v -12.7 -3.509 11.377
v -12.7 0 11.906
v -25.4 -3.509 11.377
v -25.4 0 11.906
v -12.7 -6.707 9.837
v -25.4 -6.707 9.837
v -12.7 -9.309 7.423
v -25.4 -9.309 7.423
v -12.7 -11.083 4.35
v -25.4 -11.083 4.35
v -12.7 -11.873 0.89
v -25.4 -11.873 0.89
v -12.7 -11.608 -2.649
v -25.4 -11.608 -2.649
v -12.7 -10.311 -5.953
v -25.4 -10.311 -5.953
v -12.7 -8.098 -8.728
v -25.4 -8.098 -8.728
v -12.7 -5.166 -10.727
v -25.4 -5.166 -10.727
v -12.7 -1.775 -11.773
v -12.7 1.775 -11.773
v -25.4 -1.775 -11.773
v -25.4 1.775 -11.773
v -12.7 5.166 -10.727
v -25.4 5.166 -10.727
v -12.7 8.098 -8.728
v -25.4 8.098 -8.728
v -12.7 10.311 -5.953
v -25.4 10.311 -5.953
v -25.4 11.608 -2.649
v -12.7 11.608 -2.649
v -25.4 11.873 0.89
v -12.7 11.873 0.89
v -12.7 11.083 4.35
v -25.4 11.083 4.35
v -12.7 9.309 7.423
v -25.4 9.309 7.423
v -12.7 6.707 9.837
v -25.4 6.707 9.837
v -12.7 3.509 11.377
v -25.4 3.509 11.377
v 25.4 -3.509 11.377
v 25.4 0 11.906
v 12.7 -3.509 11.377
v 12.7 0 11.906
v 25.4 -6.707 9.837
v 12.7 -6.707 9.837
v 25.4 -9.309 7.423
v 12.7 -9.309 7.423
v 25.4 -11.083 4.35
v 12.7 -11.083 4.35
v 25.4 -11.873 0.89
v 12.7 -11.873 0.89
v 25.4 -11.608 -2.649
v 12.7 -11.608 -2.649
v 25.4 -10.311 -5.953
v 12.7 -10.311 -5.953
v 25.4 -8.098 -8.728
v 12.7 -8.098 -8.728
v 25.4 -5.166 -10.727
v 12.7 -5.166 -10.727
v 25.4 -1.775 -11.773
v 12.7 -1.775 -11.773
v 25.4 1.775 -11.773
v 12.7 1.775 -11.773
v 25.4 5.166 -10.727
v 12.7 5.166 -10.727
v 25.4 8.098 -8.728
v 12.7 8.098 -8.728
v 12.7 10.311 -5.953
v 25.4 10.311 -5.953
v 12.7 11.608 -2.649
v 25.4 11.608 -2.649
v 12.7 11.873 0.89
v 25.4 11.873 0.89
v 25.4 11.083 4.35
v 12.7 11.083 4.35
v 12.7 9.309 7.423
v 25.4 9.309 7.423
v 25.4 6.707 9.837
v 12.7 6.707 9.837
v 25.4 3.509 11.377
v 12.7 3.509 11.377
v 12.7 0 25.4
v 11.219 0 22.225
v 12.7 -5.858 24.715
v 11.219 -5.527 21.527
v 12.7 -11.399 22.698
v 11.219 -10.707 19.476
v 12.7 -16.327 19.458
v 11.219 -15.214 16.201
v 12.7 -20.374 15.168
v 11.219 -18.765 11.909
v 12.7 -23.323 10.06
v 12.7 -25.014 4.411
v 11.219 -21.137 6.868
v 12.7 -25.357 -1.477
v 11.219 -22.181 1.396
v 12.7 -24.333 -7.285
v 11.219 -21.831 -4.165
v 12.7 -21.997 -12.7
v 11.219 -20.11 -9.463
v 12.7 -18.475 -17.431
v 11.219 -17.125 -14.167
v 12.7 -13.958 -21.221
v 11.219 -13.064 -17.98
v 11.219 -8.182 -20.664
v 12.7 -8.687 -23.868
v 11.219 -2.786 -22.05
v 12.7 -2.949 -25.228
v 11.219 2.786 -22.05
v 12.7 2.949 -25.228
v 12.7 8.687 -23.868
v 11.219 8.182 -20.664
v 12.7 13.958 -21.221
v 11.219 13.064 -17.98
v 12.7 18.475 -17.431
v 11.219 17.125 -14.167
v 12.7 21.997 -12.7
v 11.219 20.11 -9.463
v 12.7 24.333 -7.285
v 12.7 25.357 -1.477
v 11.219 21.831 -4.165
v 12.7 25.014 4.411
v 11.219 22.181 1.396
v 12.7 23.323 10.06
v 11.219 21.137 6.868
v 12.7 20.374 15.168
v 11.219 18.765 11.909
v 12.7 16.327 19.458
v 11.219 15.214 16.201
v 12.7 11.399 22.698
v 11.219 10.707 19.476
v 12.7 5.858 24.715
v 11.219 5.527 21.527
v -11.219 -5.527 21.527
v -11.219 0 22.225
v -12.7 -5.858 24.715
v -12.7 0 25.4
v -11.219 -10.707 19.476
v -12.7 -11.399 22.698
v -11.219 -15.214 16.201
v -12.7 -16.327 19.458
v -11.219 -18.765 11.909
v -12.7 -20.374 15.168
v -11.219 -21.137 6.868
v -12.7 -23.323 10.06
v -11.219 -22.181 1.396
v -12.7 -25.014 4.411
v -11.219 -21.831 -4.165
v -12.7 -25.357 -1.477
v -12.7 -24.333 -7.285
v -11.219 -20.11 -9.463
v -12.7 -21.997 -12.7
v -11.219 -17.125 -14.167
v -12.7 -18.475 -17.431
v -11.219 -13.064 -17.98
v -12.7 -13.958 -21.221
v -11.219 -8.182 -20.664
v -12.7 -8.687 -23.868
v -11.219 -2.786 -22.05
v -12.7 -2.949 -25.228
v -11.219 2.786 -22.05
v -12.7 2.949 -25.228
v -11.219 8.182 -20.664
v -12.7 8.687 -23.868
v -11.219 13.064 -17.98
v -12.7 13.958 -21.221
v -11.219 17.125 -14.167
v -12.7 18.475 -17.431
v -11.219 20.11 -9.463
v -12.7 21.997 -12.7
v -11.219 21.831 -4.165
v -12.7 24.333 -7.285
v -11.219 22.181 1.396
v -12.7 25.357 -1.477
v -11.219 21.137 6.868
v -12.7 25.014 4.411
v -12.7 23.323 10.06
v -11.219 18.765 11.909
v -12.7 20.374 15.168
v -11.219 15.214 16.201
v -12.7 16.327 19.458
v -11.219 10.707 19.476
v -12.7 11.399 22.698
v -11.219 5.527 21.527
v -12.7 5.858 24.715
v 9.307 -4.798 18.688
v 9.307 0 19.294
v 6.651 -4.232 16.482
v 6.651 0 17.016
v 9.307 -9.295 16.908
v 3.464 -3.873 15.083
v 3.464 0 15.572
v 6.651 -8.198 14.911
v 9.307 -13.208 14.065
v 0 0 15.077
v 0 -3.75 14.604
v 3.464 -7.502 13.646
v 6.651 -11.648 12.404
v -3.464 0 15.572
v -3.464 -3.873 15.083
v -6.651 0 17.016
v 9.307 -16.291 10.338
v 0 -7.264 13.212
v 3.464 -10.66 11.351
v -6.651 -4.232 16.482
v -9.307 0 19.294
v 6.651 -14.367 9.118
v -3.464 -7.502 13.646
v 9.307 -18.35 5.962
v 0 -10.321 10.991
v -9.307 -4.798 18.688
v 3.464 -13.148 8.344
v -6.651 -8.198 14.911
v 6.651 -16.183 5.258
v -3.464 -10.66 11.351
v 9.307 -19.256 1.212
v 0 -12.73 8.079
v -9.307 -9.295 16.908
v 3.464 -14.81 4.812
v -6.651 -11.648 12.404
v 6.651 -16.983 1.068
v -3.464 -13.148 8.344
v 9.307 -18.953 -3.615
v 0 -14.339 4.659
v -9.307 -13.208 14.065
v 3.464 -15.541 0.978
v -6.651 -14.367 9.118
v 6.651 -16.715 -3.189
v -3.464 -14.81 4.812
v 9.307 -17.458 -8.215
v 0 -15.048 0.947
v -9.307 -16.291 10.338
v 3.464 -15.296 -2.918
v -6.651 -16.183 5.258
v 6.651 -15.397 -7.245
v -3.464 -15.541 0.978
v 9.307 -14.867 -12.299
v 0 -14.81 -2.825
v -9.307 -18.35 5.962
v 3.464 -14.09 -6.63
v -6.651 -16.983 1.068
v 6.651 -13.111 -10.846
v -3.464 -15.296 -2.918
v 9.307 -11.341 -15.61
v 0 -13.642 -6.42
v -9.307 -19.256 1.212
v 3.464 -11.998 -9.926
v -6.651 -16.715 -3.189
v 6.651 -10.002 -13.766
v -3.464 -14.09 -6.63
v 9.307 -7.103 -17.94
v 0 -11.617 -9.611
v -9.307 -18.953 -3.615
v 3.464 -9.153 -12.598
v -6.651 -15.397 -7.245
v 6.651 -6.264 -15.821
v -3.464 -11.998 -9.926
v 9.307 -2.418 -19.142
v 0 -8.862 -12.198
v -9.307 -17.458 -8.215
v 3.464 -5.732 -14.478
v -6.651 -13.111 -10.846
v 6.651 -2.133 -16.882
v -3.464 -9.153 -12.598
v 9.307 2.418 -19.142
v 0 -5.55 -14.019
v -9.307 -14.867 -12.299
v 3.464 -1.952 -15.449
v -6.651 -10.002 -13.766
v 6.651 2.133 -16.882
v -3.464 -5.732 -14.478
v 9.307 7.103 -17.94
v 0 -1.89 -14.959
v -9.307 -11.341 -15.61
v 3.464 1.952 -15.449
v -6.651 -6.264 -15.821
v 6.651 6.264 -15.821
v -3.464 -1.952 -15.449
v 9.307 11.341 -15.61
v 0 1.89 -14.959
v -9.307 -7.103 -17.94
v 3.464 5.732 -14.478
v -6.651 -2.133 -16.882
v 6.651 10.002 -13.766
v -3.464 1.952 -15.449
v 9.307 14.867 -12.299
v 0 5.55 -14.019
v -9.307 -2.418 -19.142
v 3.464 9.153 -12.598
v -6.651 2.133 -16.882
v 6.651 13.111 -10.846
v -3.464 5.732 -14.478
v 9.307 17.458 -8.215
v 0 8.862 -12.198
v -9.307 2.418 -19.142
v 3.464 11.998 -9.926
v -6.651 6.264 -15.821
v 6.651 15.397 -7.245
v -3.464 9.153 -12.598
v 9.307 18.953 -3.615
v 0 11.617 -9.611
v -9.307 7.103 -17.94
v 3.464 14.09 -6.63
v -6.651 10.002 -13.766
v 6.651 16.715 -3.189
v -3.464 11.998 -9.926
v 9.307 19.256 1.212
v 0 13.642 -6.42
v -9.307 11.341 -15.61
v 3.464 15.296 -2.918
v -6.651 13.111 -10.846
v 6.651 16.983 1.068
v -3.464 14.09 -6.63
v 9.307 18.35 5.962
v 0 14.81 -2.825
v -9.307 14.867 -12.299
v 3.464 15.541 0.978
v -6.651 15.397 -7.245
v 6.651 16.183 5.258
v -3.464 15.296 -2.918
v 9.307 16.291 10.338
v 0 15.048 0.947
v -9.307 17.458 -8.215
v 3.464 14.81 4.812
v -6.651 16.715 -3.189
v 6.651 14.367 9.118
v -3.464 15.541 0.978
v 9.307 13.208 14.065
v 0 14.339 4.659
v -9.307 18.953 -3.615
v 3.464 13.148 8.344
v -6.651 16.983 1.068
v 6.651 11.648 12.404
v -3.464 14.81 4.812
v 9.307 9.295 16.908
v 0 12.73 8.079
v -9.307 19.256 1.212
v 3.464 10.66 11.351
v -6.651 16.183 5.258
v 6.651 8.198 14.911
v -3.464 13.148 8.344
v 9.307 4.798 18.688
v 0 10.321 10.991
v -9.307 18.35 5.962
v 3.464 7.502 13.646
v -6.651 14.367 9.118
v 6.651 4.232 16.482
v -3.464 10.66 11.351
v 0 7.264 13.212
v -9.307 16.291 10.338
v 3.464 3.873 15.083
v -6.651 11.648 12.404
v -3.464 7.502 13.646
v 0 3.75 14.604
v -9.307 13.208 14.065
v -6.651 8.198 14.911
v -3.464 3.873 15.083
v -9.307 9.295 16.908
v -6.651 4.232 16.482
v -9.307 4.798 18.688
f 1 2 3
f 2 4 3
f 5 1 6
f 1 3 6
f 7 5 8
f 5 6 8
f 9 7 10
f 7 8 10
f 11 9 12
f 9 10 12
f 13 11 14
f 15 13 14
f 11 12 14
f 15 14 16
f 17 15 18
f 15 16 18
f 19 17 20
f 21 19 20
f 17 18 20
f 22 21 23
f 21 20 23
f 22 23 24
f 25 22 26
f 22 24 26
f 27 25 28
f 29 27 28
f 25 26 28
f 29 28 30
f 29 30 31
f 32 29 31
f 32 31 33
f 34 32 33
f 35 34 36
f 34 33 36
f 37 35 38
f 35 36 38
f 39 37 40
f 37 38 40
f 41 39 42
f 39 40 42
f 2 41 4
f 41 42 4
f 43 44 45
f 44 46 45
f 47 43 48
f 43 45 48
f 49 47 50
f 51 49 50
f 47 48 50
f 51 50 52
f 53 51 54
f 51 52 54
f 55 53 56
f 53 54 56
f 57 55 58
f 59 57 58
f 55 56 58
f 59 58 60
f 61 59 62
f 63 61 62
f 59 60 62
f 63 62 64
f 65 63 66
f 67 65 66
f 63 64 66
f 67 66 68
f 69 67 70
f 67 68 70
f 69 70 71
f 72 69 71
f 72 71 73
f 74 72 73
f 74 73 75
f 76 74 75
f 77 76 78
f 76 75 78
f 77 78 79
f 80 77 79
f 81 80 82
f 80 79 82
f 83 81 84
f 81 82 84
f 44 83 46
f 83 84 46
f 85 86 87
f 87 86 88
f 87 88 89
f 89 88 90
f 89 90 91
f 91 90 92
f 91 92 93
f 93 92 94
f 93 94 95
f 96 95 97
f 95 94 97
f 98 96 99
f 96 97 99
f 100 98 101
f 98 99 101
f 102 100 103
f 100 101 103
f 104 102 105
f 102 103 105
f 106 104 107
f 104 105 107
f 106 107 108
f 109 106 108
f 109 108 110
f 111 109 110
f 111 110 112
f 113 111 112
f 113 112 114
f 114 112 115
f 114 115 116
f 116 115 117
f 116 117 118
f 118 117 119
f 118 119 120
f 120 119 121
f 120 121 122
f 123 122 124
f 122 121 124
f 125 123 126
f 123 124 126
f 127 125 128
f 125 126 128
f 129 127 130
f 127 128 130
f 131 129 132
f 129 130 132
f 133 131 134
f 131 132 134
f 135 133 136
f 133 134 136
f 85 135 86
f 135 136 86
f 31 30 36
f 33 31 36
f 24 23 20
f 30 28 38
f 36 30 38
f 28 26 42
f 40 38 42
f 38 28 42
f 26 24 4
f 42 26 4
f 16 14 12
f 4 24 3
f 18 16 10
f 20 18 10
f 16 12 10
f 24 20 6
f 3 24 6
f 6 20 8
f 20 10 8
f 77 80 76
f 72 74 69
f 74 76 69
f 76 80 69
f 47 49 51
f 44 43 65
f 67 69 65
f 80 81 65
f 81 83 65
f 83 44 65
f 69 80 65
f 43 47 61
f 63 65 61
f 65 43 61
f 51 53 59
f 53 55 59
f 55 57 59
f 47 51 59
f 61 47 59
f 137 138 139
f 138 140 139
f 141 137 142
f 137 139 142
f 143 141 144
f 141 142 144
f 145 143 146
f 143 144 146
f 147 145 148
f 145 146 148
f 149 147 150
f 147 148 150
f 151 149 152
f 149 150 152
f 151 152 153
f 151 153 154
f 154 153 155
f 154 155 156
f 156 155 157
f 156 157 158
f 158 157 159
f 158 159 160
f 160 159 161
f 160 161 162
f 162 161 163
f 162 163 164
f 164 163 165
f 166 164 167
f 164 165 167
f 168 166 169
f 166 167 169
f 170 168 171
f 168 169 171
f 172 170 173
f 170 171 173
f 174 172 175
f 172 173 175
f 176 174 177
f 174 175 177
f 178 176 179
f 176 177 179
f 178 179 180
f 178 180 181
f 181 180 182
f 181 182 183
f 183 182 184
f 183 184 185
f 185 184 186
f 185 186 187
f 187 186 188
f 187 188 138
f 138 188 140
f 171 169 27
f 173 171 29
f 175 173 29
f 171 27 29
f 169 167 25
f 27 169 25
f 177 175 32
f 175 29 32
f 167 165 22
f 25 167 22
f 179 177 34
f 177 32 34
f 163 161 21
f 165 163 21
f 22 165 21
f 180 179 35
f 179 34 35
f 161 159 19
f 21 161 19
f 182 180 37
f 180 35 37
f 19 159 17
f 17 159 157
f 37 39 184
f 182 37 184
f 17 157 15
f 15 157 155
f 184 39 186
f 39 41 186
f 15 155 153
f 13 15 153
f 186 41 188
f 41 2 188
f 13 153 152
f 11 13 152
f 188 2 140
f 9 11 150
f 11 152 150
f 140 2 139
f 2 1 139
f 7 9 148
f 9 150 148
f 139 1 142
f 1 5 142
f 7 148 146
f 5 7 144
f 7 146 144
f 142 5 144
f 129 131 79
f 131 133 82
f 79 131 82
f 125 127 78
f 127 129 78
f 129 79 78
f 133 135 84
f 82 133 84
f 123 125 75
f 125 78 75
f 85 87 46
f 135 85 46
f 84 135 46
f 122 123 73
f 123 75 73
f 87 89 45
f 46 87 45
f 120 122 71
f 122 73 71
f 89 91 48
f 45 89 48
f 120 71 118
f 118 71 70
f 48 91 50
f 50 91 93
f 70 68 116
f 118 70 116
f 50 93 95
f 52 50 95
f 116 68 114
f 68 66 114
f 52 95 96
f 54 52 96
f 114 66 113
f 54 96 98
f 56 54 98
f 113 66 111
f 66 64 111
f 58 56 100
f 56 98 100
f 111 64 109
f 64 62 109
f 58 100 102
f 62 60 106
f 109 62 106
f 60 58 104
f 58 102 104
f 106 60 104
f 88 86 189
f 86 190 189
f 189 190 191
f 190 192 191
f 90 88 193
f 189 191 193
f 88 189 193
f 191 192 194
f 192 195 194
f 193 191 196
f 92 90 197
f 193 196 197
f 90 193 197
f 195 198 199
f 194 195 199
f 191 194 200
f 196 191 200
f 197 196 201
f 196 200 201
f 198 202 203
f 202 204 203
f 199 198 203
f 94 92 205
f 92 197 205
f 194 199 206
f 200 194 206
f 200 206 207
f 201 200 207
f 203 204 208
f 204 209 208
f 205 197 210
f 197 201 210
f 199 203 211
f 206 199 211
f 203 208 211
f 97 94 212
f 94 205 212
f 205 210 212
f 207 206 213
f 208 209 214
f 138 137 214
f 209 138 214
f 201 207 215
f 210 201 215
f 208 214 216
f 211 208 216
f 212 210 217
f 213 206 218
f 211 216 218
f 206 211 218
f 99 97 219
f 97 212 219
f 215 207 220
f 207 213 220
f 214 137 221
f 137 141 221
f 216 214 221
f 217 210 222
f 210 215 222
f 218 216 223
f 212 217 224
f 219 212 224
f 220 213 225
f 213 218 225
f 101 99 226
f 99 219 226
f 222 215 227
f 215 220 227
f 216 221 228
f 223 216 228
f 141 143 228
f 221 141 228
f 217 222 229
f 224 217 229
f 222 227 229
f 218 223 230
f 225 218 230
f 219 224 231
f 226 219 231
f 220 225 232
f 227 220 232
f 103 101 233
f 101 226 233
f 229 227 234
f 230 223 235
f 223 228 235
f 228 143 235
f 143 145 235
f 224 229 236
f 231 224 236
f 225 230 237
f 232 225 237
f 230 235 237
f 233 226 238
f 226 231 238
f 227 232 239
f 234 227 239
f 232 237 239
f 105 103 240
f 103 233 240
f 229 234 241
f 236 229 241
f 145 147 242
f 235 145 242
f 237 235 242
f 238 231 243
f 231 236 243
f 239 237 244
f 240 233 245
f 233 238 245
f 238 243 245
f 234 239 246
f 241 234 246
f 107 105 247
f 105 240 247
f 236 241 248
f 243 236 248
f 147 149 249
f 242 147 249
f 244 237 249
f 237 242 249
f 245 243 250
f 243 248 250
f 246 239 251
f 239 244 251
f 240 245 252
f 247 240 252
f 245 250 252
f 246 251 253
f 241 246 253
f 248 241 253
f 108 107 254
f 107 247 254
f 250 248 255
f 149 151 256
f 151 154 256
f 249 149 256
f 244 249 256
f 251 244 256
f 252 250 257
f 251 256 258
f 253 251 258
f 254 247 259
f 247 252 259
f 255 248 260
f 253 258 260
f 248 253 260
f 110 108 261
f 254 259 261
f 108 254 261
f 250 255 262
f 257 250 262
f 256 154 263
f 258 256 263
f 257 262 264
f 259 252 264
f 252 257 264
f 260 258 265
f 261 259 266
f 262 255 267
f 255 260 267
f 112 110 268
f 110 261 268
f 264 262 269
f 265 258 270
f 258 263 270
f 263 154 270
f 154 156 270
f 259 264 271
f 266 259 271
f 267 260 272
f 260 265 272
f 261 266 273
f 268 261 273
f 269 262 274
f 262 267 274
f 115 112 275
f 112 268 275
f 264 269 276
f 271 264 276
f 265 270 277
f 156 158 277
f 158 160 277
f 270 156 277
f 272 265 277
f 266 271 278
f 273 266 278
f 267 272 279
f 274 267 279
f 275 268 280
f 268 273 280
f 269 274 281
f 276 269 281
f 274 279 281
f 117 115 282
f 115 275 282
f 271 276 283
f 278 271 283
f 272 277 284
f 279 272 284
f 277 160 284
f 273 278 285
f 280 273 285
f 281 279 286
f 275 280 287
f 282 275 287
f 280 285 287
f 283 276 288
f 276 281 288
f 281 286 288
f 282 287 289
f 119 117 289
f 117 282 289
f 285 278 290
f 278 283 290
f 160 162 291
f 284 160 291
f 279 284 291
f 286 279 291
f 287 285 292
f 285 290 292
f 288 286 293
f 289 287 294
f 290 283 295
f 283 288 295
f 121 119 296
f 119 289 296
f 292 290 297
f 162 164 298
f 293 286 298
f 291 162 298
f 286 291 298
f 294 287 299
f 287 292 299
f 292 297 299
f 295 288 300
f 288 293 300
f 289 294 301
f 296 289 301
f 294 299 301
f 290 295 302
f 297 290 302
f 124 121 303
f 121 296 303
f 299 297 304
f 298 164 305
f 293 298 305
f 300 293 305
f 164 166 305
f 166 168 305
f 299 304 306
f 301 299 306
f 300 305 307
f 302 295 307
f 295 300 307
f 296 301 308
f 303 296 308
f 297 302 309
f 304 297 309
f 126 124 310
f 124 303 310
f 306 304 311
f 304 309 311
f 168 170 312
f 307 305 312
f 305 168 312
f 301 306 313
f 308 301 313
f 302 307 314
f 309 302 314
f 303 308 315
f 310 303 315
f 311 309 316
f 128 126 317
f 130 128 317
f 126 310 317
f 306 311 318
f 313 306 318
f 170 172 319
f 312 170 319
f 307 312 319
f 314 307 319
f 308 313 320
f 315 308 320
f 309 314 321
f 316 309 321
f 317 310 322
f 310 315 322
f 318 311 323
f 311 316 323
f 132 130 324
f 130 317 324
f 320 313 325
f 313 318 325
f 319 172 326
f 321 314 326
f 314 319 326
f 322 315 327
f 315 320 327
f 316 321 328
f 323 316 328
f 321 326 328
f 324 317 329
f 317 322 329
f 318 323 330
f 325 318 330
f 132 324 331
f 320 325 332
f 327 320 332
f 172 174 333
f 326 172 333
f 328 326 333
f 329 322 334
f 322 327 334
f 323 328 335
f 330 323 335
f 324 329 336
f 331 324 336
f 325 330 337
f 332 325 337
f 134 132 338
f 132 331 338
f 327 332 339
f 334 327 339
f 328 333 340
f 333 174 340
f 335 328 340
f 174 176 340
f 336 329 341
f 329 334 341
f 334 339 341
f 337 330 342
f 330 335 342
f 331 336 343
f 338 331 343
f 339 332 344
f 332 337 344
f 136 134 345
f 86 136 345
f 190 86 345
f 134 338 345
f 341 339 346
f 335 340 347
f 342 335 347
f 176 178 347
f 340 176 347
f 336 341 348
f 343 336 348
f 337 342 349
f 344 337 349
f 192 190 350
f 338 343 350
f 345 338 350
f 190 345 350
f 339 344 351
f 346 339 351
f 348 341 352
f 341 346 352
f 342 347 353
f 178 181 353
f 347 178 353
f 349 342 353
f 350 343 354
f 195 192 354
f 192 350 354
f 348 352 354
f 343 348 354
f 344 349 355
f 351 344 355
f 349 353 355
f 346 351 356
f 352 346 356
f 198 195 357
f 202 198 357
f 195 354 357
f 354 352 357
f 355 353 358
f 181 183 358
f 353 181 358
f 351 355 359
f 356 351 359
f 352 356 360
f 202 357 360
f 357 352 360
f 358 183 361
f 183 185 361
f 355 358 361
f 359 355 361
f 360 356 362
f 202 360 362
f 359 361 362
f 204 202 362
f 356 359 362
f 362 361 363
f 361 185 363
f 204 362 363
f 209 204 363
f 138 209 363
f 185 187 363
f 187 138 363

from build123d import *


with BuildPart() as f1:
    # F0 (on Front) → F1 (revolve)
    with BuildSketch(Plane.XZ):
        with BuildLine():
            Line((-25.4, 11.90625), (-25.4, 0))
            Line((-25.4, 0), (0, 0))
            Line((0, 0), (25.4, 0))
            Line((25.4, 0), (25.4, 11.90625))
            Line((25.4, 11.90625), (12.7, 11.90625))
            Line((12.7, 11.90625), (12.7, 25.4))
            Line((12.7, 25.4), (11.219473, 22.225))
            ThreePointArc((11.219473, 22.225), (0, 15.077407), (-11.219473, 22.225))
            Line((-11.219473, 22.225), (-12.7, 25.4))
            Line((-12.7, 25.4), (-12.7, 11.90625))
            Line((-12.7, 11.90625), (-25.4, 11.90625))
        make_face()
    revolve(axis=Axis((-5.579621, 0, 0), (1, 0, 0)))


solid = f1.part
